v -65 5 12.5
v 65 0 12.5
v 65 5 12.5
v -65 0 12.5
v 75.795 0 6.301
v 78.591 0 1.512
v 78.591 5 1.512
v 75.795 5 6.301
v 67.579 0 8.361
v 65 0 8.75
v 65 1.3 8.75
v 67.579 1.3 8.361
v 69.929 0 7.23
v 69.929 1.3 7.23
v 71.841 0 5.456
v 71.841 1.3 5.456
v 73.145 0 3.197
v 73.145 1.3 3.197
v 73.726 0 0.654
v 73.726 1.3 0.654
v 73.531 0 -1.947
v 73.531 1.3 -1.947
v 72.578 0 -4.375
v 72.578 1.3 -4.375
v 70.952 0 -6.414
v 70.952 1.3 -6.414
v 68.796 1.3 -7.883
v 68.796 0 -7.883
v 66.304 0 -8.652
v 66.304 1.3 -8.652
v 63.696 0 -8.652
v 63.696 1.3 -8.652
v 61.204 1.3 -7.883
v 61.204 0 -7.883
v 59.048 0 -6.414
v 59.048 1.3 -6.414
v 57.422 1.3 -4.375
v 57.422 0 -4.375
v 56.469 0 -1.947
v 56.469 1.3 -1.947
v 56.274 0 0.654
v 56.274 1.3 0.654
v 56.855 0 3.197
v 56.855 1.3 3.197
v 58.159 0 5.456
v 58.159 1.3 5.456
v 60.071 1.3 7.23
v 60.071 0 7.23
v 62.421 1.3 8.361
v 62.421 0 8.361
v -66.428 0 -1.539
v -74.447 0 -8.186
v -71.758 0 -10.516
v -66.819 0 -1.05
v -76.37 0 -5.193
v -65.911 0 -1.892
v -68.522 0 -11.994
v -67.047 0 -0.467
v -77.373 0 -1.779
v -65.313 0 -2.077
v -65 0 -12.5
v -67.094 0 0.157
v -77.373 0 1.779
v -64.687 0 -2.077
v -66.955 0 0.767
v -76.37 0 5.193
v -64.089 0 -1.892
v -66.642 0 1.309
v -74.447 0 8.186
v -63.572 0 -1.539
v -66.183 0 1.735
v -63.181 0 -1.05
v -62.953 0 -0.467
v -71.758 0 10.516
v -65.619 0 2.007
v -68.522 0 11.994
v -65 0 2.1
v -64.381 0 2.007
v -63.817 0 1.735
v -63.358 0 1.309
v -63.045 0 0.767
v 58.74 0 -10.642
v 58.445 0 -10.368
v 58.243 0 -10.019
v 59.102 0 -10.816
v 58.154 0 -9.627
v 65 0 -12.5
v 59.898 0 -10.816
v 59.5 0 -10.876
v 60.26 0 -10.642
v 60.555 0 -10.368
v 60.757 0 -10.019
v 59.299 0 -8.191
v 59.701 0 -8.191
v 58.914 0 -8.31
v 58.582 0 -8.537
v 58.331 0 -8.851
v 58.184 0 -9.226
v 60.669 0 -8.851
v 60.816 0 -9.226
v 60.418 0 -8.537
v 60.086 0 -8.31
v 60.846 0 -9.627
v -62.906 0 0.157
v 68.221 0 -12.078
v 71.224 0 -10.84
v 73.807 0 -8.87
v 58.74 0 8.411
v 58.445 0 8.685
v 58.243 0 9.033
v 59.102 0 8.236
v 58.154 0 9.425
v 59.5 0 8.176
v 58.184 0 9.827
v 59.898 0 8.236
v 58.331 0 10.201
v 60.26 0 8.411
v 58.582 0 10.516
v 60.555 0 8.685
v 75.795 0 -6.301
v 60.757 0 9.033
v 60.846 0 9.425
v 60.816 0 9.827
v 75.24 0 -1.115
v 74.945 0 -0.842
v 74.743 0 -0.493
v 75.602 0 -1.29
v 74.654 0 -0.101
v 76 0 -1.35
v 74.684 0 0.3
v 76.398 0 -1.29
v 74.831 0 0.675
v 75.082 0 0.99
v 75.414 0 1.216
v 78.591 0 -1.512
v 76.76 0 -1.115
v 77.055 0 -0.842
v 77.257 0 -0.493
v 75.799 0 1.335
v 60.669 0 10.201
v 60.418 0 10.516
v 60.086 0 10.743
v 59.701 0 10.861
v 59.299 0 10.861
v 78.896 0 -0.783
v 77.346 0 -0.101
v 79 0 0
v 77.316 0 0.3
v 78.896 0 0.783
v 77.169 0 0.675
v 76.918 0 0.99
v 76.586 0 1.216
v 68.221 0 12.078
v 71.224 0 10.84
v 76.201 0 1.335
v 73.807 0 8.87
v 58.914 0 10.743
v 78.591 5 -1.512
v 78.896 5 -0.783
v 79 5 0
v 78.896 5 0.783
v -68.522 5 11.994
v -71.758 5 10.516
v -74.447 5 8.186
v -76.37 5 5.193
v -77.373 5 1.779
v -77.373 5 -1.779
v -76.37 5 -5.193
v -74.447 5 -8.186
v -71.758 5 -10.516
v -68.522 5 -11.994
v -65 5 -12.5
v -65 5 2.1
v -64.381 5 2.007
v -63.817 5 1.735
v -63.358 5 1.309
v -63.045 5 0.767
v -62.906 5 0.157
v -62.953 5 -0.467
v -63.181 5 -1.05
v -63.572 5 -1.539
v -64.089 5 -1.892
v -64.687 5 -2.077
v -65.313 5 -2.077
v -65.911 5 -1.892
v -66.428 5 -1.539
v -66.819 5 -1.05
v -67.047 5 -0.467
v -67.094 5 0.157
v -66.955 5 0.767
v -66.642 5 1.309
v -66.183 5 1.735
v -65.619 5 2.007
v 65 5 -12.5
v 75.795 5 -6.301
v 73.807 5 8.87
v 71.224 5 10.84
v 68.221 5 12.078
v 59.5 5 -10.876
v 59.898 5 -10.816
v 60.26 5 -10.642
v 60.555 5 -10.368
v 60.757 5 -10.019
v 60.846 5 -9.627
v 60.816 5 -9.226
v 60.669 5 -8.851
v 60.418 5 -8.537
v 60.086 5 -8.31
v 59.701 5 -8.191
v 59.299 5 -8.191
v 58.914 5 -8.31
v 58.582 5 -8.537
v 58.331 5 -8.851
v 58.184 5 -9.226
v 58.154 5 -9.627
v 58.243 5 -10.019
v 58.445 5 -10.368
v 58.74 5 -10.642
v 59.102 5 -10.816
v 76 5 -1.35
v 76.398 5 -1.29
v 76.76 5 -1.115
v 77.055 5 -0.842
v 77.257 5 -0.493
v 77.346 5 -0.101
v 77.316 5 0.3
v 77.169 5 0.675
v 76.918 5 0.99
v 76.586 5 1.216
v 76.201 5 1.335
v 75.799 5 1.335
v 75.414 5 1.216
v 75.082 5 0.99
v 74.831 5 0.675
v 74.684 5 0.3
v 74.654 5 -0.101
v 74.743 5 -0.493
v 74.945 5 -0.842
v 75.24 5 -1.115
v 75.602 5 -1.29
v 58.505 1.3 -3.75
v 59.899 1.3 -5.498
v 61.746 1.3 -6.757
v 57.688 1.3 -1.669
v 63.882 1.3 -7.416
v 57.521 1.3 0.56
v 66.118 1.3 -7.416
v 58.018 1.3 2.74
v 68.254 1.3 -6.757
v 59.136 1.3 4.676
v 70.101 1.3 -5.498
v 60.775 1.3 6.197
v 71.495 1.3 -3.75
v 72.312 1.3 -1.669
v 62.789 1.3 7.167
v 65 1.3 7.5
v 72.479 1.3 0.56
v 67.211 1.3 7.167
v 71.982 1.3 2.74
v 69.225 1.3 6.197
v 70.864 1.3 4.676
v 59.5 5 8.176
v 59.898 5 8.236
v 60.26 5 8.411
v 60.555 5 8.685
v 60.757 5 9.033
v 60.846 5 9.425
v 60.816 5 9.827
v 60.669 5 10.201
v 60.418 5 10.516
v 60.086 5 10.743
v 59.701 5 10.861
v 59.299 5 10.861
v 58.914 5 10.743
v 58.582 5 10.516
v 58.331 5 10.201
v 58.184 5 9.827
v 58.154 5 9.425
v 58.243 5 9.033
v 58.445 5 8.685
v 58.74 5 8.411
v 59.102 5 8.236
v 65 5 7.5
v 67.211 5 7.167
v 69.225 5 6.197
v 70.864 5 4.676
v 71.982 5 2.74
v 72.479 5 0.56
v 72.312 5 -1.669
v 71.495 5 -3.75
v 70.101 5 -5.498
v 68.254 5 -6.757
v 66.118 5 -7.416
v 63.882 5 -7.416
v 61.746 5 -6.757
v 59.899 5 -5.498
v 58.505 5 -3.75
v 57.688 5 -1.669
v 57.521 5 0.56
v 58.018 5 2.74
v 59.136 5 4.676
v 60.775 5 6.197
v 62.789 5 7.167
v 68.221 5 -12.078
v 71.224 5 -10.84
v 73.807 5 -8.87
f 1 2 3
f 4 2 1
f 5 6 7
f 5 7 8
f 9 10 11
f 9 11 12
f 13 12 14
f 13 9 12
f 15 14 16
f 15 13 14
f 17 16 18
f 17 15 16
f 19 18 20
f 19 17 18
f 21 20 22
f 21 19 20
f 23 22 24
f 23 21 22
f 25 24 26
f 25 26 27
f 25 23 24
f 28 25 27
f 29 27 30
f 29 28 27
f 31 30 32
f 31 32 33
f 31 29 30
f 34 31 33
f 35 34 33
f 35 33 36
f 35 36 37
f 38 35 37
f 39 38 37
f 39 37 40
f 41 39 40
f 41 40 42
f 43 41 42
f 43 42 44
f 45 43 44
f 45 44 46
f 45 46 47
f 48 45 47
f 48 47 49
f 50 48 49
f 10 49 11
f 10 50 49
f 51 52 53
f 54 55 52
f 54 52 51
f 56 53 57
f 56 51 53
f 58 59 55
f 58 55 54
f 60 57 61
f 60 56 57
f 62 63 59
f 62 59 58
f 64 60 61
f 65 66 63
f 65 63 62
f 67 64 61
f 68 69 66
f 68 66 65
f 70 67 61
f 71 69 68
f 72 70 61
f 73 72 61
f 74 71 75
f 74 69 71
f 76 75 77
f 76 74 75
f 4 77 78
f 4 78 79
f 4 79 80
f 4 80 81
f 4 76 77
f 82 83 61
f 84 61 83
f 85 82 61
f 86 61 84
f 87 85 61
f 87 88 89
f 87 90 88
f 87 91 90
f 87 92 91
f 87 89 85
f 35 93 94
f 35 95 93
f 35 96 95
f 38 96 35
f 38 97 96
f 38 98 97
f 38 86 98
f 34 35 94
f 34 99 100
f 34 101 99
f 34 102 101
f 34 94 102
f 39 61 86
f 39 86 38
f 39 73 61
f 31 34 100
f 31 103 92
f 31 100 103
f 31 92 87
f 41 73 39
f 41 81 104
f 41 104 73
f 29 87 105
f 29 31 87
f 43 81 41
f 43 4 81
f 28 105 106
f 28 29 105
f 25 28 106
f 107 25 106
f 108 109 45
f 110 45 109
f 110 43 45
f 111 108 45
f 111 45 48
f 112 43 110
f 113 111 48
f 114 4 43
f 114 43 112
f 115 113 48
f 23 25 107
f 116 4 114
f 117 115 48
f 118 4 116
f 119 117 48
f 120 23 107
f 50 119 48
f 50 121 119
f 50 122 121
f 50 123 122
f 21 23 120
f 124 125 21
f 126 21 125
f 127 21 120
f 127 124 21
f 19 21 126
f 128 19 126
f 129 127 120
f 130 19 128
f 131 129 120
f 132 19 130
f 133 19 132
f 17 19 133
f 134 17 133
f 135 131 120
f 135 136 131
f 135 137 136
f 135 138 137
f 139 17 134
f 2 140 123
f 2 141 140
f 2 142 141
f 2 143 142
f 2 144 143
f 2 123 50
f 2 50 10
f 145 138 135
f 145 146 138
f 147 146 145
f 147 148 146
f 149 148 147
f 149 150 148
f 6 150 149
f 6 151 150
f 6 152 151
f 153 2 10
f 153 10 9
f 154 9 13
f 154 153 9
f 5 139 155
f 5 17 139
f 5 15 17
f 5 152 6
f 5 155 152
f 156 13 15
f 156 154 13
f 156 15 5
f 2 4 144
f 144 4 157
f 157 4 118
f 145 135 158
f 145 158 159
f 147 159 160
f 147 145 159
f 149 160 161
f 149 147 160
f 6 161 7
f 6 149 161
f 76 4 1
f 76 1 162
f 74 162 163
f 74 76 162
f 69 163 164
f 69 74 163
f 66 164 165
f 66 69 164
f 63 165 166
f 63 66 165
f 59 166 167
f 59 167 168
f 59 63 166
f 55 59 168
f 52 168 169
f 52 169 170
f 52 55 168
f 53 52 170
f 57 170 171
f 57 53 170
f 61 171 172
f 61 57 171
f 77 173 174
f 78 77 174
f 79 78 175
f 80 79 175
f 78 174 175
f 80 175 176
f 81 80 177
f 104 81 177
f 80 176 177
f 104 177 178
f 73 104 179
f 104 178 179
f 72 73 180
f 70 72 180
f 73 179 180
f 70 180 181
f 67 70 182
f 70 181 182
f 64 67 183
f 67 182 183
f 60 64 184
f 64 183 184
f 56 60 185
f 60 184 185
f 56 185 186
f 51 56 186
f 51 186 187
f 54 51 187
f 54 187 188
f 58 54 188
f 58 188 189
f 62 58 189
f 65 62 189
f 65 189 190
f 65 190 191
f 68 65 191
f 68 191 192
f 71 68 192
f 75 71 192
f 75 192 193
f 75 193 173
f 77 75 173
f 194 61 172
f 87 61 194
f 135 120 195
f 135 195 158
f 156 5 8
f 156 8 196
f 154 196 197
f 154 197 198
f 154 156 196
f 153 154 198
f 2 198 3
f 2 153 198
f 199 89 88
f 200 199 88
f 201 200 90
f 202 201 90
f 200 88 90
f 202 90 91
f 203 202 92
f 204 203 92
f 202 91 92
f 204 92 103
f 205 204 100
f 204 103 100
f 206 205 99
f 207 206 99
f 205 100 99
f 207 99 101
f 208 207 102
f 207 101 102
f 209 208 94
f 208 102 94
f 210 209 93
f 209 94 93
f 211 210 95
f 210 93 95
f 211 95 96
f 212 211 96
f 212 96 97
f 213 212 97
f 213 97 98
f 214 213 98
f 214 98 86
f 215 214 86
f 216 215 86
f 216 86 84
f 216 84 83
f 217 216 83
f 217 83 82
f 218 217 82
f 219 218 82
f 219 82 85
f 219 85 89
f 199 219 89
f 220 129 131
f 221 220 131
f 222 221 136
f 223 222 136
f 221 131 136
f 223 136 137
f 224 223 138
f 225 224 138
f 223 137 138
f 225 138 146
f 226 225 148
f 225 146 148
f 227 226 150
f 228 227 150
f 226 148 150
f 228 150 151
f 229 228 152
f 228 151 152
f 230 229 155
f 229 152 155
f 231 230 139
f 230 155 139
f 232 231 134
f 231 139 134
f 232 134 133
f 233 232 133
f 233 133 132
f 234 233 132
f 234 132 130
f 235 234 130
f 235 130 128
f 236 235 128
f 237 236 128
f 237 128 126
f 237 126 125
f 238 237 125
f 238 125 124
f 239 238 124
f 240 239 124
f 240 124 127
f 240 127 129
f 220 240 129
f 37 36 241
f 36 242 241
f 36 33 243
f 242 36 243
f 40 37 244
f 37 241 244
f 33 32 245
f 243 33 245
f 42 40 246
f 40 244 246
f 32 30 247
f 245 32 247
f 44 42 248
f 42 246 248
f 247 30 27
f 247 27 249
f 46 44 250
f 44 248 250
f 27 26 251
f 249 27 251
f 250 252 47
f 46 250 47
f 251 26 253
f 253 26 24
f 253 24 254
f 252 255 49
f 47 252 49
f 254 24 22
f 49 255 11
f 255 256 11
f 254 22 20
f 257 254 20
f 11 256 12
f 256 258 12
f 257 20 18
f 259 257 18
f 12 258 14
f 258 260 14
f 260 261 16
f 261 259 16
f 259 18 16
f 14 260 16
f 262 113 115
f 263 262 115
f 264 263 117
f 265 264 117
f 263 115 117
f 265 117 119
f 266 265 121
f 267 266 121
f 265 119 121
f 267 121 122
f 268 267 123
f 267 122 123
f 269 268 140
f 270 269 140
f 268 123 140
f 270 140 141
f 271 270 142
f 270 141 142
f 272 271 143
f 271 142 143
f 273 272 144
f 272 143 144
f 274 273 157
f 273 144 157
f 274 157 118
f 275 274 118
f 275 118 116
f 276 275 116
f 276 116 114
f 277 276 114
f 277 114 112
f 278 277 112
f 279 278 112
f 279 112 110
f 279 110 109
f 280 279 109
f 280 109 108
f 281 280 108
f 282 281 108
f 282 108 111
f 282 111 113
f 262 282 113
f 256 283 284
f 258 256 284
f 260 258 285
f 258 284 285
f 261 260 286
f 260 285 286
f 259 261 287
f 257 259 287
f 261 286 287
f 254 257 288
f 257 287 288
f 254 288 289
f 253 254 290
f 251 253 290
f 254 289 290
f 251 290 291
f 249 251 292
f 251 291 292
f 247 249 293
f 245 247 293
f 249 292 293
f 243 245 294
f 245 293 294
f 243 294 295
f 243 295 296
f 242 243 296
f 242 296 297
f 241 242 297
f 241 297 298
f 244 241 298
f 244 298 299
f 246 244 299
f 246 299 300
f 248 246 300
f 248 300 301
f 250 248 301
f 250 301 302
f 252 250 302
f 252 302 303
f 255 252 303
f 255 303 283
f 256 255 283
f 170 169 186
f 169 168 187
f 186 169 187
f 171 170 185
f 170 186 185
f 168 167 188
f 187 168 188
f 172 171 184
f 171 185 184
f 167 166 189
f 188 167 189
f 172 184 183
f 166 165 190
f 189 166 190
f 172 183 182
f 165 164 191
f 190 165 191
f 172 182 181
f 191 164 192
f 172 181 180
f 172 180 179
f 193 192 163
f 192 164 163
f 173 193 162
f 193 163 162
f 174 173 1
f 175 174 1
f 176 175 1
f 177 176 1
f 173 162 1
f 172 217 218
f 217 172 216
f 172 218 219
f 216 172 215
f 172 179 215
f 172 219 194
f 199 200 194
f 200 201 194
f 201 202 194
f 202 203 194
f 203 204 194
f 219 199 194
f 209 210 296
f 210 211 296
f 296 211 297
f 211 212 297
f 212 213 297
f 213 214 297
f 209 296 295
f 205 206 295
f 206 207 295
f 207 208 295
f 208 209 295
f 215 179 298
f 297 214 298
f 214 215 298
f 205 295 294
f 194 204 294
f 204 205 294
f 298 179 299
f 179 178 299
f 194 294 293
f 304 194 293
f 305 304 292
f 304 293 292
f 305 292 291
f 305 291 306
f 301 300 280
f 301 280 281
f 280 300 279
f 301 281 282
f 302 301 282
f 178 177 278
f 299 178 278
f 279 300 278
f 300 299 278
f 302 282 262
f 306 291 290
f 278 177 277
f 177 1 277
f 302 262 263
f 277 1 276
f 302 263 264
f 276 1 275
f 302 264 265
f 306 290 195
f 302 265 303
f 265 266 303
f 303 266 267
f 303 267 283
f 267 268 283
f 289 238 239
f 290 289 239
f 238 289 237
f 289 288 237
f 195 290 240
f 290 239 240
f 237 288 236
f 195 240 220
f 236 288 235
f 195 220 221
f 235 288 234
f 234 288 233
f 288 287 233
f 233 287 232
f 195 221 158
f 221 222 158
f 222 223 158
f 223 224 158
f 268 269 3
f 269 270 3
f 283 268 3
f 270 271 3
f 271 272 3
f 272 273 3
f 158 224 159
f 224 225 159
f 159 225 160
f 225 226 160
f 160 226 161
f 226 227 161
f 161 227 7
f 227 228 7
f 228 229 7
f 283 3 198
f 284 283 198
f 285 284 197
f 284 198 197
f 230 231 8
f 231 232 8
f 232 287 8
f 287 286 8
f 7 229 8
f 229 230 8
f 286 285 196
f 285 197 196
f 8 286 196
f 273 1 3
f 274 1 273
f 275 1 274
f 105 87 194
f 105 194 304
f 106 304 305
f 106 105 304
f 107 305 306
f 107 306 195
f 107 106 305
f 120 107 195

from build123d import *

# Parameters (mm, degrees)
EXTRUDE_1_DEPTH     = 5
EXTRUDE_5_DEPTH     = 5
CUT_EXTRUDE_2_REACH = 82.139
SKETCH_7_R          = 7.5
SKETCH_8_R          = 8.75
CUT_EXTRUDE_3_DEPTH = 1.3
CUT_EXTRUDE_4_REACH = 82.139
SKETCH_9_R          = 1.35
CUT_EXTRUDE_5_REACH = 82.139
SKETCH_12_R         = 2.1


with BuildPart() as part:
    # 草图1 → 凸台-拉伸1 (new body)
    with BuildSketch(Plane(origin=(0, 0, 0), x_dir=(1, 0, 0), z_dir=(0, 1, 0))):
        with BuildLine():
            Line((-65, 12.5), (65, 12.5))
            ThreePointArc((65, 12.5), (77.5, 0), (65, -12.5))
            Line((65, -12.5), (-65, -12.5))
            ThreePointArc((-65, -12.5), (-77.5, 0), (-65, 12.5))
        make_face()
    extrude(amount=EXTRUDE_1_DEPTH)

    # 草图10 → 凸台-拉伸5 (add)
    with BuildSketch(Plane.XZ):
        with BuildLine():
            Line((75.795454545, -6.301441197), (78.590909091, -1.512345887))
            ThreePointArc((78.590909091, -1.512345887), (79, 0), (78.590909091, 1.512345887))
            Line((78.590909091, 1.512345887), (75.795454545, 6.301441197))
            Line((75.795454545, 6.301441197), (75.795454545, -6.301441197))
        make_face()
    extrude(amount=-EXTRUDE_5_DEPTH)

    # 草图7 → 切除-拉伸2 (cut, up to next)
    with BuildSketch(Plane(origin=(0, 5, 0), x_dir=(1, 0, 0), z_dir=(0, 1, 0)), mode=Mode.PRIVATE) as cut_extrude_2_sk1:
        with Locations(Location((65, 0, 0), (0, 0, 270))):
            Circle(SKETCH_7_R)
    cut_extrude_2_tool1 = extrude(cut_extrude_2_sk1.sketch, amount=-CUT_EXTRUDE_2_REACH, mode=Mode.PRIVATE) & part.part
    add(cut_extrude_2_tool1.solids().sort_by_distance((65, 5, 0))[0], mode=Mode.SUBTRACT)

    # 草图8 → 切除-拉伸3 (cut)
    with BuildSketch(Plane(origin=(0, 0, 0), x_dir=(1, 0, 0), z_dir=(0, 1, 0))):
        with Locations(Location((65, 0, 0), (0, 0, 270))):
            Circle(SKETCH_8_R)
    extrude(amount=CUT_EXTRUDE_3_DEPTH, mode=Mode.SUBTRACT)

    # 草图9 → 切除-拉伸4 (cut, up to next)
    with BuildSketch(Plane.XZ, mode=Mode.PRIVATE) as cut_extrude_4_sk1:
        with Locations(Location((59.5, 9.526279442, 0), (0, 0, 270))):
            Circle(SKETCH_9_R)
    cut_extrude_4_tool1 = extrude(cut_extrude_4_sk1.sketch, amount=-CUT_EXTRUDE_4_REACH, mode=Mode.PRIVATE) & part.part
    # 草图9 → 切除-拉伸4 (cut, up to next)
    with BuildSketch(Plane.XZ, mode=Mode.PRIVATE) as cut_extrude_4_sk2:
        with Locations(Location((76, 0, 0), (0, 0, 270))):
            Circle(SKETCH_9_R)
    cut_extrude_4_tool2 = extrude(cut_extrude_4_sk2.sketch, amount=-CUT_EXTRUDE_4_REACH, mode=Mode.PRIVATE) & part.part
    # 草图9 → 切除-拉伸4 (cut, up to next)
    with BuildSketch(Plane.XZ, mode=Mode.PRIVATE) as cut_extrude_4_sk3:
        with Locations(Location((59.5, -9.526279442, 0), (0, 0, 270))):
            Circle(SKETCH_9_R)
    cut_extrude_4_tool3 = extrude(cut_extrude_4_sk3.sketch, amount=-CUT_EXTRUDE_4_REACH, mode=Mode.PRIVATE) & part.part
    add(cut_extrude_4_tool1.solids().sort_by_distance((59.5, 0, 9.526279))[0], mode=Mode.SUBTRACT)
    add(cut_extrude_4_tool2.solids().sort_by_distance((76, 0, 0))[0], mode=Mode.SUBTRACT)
    add(cut_extrude_4_tool3.solids().sort_by_distance((59.5, 0, -9.526279))[0], mode=Mode.SUBTRACT)

    # 草图12 → 切除-拉伸5 (cut, up to next)
    with BuildSketch(Plane(origin=(0, 5, 0), x_dir=(1, 0, 0), z_dir=(0, 1, 0)), mode=Mode.PRIVATE) as cut_extrude_5_sk1:
        with Locations(Location((-65, 0, 0), (0, 0, 270))):
            Circle(SKETCH_12_R)
    cut_extrude_5_tool1 = extrude(cut_extrude_5_sk1.sketch, amount=-CUT_EXTRUDE_5_REACH, mode=Mode.PRIVATE) & part.part
    add(cut_extrude_5_tool1.solids().sort_by_distance((-65, 5, 0))[0], mode=Mode.SUBTRACT)


solid = part.part
